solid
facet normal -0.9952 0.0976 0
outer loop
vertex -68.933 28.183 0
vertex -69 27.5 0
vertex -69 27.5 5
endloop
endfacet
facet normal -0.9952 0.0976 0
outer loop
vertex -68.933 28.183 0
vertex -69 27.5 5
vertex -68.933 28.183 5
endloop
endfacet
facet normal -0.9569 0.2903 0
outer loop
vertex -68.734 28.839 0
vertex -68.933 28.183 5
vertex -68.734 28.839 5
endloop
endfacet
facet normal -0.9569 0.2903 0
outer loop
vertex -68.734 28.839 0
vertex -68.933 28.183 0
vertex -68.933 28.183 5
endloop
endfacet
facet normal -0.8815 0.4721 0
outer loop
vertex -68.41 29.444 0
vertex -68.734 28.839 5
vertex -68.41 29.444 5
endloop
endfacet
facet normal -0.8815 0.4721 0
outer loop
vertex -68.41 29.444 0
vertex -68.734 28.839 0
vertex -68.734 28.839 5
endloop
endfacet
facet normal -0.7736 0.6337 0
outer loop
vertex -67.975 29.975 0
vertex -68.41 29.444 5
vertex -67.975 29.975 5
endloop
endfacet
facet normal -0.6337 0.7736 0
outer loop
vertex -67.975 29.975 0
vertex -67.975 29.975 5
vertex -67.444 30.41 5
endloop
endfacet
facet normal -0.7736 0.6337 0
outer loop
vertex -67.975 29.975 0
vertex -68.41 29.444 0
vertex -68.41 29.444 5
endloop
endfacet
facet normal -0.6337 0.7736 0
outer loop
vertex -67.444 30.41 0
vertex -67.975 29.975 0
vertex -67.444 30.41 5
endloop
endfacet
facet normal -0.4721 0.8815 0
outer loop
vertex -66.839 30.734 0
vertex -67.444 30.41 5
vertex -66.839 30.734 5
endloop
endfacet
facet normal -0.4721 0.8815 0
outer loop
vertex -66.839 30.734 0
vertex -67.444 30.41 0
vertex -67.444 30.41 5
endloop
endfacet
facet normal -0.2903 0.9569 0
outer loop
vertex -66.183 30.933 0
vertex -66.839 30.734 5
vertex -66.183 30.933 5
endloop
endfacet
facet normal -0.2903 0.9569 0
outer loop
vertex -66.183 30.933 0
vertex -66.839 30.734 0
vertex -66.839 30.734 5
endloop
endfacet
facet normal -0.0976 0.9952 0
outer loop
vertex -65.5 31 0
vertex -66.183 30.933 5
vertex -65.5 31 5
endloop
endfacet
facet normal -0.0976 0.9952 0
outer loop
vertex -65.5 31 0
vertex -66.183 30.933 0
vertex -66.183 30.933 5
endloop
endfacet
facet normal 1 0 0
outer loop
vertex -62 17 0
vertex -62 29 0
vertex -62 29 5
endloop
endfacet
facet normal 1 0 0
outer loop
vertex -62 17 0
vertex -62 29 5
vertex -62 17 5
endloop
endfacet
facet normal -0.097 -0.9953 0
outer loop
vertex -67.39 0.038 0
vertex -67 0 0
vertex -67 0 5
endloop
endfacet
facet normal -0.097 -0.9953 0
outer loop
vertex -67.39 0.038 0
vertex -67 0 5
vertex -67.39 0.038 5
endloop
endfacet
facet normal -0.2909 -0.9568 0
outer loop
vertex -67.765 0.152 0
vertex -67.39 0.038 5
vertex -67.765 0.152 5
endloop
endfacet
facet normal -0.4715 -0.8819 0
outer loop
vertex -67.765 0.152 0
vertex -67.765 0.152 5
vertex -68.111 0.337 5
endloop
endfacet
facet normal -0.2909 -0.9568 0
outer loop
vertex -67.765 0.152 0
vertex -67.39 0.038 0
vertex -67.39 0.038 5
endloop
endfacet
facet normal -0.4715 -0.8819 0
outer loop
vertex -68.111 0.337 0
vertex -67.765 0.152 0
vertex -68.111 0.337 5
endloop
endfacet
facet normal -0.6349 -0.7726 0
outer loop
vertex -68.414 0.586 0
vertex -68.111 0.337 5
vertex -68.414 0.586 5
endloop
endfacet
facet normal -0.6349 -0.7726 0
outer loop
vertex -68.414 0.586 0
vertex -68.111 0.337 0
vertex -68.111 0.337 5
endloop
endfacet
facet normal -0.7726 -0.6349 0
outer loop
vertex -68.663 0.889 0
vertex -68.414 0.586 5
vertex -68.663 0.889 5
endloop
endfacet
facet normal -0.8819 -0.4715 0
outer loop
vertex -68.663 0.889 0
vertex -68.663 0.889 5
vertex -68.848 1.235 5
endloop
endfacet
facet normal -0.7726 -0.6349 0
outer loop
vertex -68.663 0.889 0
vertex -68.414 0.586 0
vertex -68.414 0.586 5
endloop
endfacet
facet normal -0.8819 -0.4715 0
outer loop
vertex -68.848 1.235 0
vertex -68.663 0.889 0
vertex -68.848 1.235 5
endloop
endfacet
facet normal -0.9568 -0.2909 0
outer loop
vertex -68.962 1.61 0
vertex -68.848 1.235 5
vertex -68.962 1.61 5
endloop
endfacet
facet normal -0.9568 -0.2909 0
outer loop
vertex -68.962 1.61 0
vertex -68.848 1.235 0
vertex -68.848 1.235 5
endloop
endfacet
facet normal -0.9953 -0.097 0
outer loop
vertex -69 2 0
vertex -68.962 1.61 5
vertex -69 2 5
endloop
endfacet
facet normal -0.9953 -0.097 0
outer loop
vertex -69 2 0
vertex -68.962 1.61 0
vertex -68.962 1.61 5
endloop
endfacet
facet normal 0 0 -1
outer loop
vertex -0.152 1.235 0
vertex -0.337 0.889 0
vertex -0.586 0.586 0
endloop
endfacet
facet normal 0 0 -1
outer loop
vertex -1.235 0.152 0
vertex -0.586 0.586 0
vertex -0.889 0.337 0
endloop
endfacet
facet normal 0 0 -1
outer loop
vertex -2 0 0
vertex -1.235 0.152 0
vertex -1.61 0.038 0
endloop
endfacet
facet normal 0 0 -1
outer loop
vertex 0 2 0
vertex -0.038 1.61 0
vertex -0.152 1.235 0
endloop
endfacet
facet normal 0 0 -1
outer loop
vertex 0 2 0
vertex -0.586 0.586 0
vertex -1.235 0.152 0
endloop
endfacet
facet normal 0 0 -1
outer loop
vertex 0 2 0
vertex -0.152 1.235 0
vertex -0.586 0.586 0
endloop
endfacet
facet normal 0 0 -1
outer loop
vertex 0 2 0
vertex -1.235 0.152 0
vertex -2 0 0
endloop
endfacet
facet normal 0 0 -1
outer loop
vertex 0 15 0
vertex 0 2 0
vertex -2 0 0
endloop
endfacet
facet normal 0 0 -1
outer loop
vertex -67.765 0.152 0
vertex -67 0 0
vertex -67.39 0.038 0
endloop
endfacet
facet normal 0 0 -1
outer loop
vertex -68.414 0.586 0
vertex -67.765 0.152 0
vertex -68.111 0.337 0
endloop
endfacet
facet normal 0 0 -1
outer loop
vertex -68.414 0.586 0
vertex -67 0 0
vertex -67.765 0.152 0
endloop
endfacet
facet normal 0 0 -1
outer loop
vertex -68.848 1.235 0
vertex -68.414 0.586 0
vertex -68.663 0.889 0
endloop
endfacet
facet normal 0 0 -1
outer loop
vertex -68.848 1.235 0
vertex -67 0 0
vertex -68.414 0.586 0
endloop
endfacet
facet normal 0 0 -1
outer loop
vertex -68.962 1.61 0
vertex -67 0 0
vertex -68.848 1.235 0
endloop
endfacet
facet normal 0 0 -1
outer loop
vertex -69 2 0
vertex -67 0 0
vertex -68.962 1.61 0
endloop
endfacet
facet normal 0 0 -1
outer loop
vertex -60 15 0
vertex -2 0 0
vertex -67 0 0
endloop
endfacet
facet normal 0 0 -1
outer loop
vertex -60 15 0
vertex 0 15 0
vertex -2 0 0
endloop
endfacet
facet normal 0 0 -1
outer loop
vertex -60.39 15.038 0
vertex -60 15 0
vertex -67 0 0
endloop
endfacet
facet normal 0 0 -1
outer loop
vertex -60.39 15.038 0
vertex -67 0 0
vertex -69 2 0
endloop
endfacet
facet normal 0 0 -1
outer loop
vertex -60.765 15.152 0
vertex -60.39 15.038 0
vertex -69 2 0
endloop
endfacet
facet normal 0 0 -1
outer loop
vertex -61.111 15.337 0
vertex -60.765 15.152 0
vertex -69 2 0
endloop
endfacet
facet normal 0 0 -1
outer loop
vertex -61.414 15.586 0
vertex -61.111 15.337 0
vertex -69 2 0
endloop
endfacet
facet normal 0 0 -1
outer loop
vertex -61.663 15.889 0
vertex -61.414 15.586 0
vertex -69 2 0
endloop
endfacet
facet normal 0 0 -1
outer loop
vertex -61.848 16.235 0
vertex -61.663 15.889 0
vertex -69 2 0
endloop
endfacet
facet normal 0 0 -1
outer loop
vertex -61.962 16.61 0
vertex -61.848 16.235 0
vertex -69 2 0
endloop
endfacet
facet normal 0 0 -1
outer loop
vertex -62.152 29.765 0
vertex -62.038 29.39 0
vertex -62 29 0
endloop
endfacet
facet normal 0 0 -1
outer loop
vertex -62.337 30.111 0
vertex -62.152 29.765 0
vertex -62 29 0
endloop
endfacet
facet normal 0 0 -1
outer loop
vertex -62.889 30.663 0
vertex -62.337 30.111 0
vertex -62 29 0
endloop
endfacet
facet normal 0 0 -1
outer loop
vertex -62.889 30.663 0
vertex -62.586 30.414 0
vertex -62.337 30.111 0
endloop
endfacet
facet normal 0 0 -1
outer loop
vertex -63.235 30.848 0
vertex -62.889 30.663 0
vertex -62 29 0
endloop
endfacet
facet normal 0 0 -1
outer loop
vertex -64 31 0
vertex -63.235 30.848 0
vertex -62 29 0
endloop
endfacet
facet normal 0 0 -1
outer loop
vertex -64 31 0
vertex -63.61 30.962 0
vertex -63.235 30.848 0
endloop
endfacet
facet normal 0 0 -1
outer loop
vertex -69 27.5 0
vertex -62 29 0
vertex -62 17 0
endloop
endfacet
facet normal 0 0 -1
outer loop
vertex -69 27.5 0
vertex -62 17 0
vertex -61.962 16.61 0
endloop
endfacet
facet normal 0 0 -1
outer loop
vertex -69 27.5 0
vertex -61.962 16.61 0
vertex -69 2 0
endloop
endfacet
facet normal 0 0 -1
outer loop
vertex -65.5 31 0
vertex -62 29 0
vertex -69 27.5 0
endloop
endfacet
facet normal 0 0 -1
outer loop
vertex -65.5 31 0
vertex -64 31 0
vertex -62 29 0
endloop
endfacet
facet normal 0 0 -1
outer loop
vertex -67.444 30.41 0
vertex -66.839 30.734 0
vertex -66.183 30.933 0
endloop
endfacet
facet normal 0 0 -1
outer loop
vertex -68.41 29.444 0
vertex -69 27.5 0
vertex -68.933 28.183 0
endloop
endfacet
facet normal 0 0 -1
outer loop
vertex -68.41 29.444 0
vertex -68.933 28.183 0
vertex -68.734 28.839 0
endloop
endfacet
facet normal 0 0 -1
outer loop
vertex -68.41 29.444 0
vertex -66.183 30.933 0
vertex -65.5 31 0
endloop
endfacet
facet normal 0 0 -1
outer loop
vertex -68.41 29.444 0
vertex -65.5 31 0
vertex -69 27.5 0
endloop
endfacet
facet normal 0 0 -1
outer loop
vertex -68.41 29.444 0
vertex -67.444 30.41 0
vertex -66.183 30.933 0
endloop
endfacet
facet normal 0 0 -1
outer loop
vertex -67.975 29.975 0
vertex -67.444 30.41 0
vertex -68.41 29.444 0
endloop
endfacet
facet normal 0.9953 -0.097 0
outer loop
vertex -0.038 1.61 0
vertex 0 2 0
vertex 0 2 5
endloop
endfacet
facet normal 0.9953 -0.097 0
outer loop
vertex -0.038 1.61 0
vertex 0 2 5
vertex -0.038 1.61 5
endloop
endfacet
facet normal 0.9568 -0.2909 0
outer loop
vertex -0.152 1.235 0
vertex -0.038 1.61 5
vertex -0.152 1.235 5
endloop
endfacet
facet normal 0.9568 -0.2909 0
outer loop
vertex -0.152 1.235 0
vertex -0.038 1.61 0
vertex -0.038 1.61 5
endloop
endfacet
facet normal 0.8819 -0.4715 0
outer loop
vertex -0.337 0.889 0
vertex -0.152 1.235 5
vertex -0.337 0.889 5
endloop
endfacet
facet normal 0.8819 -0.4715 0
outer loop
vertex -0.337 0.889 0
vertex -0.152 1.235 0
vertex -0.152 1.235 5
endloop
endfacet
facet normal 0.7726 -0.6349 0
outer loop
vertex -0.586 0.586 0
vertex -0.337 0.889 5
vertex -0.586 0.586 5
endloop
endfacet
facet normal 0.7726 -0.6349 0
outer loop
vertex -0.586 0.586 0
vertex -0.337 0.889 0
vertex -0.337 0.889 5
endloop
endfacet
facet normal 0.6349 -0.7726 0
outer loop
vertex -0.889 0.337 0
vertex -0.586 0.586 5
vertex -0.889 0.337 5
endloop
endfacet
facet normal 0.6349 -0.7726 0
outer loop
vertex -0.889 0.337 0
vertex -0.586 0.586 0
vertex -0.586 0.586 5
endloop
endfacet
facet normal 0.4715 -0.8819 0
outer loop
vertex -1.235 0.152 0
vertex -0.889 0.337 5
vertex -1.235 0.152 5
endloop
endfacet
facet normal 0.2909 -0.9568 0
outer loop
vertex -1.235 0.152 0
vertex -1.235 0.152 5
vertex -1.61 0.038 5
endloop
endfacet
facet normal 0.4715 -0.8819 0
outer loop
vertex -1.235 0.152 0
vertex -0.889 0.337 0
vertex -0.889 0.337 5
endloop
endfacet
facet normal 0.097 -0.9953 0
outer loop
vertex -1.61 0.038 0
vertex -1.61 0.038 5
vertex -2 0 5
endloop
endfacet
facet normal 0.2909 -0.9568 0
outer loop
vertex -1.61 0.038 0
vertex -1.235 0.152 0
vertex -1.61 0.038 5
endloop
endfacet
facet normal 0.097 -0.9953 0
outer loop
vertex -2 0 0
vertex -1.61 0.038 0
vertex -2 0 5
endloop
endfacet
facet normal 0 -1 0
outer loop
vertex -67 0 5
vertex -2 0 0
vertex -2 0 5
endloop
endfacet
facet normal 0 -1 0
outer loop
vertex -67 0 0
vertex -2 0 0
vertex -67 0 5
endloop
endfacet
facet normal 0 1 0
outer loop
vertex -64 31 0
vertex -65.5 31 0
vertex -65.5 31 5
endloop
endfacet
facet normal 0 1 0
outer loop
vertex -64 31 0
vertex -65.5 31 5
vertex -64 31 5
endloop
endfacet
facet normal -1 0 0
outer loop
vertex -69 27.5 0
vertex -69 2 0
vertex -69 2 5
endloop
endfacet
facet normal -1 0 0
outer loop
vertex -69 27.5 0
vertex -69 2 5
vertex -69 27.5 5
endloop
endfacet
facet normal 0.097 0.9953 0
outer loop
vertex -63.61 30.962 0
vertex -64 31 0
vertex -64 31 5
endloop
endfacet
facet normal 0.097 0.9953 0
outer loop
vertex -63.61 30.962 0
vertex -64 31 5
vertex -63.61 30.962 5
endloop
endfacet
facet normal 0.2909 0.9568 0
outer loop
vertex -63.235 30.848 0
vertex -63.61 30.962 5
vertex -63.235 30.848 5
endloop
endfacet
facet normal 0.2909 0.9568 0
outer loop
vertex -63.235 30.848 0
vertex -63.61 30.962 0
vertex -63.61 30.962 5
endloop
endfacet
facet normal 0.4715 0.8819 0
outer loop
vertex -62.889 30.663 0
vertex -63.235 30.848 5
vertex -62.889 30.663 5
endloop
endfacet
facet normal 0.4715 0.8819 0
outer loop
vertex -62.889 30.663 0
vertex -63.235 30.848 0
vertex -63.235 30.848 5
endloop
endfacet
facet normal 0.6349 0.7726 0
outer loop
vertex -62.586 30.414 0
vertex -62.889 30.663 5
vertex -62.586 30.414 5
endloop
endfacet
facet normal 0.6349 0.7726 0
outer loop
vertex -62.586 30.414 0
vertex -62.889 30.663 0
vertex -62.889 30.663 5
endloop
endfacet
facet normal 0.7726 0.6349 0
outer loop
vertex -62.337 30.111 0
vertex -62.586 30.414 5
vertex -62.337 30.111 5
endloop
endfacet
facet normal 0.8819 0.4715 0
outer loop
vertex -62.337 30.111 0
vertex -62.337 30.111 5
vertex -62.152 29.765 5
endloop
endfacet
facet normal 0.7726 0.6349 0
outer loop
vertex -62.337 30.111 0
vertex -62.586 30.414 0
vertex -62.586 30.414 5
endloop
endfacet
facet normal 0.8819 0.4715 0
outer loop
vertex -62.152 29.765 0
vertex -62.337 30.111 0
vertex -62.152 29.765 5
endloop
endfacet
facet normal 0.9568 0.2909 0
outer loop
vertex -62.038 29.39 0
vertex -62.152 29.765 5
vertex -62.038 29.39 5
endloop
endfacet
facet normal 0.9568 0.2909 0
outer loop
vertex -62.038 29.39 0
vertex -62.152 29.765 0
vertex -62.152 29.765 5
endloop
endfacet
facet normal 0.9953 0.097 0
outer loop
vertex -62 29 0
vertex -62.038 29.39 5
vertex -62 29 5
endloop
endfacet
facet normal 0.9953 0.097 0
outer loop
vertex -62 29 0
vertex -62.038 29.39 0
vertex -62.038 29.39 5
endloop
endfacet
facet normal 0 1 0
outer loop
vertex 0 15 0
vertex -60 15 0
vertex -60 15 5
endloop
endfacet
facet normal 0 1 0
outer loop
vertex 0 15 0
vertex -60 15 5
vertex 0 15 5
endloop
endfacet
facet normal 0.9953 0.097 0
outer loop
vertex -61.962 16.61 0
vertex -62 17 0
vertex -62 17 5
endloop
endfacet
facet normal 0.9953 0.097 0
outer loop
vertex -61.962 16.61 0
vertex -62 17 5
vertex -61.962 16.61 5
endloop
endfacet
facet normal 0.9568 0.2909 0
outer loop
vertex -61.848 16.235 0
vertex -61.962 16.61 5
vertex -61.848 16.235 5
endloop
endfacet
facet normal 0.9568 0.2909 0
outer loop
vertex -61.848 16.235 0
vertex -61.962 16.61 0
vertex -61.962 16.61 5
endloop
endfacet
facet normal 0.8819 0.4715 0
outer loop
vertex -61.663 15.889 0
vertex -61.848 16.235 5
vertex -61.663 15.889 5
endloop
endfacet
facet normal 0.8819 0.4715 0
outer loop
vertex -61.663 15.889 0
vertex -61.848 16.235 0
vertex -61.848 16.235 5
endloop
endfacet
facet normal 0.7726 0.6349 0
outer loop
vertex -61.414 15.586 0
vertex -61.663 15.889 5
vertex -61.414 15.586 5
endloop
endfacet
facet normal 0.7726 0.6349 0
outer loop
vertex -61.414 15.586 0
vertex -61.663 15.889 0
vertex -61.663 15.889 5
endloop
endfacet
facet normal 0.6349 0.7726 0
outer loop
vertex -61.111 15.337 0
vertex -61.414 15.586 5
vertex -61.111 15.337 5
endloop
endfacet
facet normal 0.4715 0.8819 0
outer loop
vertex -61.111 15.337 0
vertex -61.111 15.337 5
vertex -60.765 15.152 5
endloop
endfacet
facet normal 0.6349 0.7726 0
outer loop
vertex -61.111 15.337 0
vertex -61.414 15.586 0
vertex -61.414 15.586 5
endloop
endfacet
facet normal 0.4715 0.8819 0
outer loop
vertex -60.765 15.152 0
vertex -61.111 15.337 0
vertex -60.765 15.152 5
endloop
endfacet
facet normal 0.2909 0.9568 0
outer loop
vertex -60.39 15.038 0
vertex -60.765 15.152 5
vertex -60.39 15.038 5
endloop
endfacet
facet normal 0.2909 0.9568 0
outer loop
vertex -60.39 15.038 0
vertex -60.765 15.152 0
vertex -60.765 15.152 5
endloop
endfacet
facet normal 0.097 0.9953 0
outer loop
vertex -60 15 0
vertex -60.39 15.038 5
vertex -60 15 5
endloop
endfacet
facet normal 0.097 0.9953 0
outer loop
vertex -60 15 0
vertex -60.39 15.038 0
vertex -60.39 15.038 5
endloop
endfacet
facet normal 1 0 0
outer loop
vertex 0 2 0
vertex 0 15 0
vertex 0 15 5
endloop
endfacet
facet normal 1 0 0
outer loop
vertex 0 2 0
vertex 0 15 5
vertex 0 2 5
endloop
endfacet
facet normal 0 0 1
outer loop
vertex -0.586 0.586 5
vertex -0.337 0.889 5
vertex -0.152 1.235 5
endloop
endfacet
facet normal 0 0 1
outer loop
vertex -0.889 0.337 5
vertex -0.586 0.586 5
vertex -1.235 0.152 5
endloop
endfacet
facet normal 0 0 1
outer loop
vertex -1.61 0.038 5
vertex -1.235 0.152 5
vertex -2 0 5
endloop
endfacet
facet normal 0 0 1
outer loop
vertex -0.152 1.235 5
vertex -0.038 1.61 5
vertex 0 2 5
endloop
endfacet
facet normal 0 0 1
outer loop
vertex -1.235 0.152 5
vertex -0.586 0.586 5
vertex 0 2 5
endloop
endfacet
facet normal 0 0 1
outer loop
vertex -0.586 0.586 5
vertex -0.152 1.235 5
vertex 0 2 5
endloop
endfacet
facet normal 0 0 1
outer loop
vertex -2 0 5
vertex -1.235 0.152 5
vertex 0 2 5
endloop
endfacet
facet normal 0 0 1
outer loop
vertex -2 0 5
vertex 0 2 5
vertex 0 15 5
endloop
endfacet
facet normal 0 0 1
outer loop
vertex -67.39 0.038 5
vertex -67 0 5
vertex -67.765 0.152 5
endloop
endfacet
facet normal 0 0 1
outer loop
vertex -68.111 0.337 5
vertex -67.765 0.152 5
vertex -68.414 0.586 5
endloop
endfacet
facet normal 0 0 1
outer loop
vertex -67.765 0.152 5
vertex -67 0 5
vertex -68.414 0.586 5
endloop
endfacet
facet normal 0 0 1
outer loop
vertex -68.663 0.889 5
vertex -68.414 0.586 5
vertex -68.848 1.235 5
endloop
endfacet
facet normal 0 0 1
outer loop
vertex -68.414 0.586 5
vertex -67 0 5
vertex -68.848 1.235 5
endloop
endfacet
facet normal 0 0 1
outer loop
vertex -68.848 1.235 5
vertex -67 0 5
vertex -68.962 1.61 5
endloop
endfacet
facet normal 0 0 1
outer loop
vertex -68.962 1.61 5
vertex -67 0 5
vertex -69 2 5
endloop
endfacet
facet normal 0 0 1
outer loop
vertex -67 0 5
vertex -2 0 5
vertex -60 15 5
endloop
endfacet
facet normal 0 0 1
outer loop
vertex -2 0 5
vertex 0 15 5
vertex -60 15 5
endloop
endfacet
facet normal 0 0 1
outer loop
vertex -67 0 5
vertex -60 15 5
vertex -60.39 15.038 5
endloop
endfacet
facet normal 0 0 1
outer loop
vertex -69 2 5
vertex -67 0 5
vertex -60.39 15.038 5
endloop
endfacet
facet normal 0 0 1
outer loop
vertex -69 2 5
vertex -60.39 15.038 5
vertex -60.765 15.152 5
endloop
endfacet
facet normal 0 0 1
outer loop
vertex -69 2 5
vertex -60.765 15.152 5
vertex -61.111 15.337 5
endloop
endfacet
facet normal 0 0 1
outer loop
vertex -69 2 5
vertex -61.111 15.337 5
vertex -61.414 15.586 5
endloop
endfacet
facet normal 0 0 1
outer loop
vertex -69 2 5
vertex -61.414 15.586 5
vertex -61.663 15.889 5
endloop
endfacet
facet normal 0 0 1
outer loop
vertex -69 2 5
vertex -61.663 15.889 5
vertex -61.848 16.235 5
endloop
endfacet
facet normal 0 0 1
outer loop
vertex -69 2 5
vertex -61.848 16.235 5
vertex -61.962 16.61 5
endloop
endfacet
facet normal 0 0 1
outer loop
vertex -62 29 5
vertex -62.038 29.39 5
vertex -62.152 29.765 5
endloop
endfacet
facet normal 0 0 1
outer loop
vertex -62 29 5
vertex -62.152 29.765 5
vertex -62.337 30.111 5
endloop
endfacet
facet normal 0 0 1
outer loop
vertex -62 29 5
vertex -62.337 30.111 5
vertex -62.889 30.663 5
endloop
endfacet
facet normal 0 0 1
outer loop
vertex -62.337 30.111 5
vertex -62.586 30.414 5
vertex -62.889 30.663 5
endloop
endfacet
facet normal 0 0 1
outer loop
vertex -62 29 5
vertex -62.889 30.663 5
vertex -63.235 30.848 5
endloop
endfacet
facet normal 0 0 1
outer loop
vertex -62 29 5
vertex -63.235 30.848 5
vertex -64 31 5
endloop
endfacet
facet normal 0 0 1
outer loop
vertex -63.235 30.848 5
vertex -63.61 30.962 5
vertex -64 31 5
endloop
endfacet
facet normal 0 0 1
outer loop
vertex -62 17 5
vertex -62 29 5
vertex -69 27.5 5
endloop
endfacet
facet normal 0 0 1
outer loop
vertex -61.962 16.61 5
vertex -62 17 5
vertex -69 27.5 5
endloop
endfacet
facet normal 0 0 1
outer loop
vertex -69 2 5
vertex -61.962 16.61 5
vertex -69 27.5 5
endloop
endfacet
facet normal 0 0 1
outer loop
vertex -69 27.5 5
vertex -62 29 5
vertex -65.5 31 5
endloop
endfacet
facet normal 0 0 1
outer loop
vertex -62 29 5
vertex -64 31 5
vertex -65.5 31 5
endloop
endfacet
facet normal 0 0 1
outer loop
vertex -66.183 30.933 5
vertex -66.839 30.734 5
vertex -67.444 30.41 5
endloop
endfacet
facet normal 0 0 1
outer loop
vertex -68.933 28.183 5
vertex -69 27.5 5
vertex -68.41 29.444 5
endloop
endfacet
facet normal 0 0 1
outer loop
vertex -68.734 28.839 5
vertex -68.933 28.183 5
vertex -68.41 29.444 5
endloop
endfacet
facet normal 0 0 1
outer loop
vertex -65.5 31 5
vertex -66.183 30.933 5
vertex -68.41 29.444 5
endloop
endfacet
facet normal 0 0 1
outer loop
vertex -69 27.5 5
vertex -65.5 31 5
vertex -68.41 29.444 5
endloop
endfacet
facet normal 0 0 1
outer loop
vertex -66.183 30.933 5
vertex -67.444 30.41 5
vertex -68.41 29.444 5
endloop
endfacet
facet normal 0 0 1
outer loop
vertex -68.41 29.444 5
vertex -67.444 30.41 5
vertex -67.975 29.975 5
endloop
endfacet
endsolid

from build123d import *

# Parameters (mm, degrees)
BOSS_EXTRU_1_DEPTH = 5


with BuildPart() as part:
    # Esquisse1 → Boss.-Extru.1 (new body)
    with BuildSketch(Plane.XY):
        with BuildLine():
            Line((-2, 0), (-67, 0))
            ThreePointArc((-67, 0), (-68.414213562, 0.585786438), (-69, 2))
            Line((-69, 2), (-69, 27.5))
            ThreePointArc((-69, 27.5), (-67.974873734, 29.974873734), (-65.5, 31))
            Line((-65.5, 31), (-64, 31))
            ThreePointArc((-64, 31), (-62.585786438, 30.414213562), (-62, 29))
            Line((-62, 29), (-62, 17))
            ThreePointArc((-62, 17), (-61.414213562, 15.585786438), (-60, 15))
            Line((-60, 15), (0, 15))
            Line((0, 15), (0, 2))
            ThreePointArc((0, 2), (-0.585786438, 0.585786438), (-2, 0))
        make_face()
    extrude(amount=BOSS_EXTRU_1_DEPTH)


solid = part.part
